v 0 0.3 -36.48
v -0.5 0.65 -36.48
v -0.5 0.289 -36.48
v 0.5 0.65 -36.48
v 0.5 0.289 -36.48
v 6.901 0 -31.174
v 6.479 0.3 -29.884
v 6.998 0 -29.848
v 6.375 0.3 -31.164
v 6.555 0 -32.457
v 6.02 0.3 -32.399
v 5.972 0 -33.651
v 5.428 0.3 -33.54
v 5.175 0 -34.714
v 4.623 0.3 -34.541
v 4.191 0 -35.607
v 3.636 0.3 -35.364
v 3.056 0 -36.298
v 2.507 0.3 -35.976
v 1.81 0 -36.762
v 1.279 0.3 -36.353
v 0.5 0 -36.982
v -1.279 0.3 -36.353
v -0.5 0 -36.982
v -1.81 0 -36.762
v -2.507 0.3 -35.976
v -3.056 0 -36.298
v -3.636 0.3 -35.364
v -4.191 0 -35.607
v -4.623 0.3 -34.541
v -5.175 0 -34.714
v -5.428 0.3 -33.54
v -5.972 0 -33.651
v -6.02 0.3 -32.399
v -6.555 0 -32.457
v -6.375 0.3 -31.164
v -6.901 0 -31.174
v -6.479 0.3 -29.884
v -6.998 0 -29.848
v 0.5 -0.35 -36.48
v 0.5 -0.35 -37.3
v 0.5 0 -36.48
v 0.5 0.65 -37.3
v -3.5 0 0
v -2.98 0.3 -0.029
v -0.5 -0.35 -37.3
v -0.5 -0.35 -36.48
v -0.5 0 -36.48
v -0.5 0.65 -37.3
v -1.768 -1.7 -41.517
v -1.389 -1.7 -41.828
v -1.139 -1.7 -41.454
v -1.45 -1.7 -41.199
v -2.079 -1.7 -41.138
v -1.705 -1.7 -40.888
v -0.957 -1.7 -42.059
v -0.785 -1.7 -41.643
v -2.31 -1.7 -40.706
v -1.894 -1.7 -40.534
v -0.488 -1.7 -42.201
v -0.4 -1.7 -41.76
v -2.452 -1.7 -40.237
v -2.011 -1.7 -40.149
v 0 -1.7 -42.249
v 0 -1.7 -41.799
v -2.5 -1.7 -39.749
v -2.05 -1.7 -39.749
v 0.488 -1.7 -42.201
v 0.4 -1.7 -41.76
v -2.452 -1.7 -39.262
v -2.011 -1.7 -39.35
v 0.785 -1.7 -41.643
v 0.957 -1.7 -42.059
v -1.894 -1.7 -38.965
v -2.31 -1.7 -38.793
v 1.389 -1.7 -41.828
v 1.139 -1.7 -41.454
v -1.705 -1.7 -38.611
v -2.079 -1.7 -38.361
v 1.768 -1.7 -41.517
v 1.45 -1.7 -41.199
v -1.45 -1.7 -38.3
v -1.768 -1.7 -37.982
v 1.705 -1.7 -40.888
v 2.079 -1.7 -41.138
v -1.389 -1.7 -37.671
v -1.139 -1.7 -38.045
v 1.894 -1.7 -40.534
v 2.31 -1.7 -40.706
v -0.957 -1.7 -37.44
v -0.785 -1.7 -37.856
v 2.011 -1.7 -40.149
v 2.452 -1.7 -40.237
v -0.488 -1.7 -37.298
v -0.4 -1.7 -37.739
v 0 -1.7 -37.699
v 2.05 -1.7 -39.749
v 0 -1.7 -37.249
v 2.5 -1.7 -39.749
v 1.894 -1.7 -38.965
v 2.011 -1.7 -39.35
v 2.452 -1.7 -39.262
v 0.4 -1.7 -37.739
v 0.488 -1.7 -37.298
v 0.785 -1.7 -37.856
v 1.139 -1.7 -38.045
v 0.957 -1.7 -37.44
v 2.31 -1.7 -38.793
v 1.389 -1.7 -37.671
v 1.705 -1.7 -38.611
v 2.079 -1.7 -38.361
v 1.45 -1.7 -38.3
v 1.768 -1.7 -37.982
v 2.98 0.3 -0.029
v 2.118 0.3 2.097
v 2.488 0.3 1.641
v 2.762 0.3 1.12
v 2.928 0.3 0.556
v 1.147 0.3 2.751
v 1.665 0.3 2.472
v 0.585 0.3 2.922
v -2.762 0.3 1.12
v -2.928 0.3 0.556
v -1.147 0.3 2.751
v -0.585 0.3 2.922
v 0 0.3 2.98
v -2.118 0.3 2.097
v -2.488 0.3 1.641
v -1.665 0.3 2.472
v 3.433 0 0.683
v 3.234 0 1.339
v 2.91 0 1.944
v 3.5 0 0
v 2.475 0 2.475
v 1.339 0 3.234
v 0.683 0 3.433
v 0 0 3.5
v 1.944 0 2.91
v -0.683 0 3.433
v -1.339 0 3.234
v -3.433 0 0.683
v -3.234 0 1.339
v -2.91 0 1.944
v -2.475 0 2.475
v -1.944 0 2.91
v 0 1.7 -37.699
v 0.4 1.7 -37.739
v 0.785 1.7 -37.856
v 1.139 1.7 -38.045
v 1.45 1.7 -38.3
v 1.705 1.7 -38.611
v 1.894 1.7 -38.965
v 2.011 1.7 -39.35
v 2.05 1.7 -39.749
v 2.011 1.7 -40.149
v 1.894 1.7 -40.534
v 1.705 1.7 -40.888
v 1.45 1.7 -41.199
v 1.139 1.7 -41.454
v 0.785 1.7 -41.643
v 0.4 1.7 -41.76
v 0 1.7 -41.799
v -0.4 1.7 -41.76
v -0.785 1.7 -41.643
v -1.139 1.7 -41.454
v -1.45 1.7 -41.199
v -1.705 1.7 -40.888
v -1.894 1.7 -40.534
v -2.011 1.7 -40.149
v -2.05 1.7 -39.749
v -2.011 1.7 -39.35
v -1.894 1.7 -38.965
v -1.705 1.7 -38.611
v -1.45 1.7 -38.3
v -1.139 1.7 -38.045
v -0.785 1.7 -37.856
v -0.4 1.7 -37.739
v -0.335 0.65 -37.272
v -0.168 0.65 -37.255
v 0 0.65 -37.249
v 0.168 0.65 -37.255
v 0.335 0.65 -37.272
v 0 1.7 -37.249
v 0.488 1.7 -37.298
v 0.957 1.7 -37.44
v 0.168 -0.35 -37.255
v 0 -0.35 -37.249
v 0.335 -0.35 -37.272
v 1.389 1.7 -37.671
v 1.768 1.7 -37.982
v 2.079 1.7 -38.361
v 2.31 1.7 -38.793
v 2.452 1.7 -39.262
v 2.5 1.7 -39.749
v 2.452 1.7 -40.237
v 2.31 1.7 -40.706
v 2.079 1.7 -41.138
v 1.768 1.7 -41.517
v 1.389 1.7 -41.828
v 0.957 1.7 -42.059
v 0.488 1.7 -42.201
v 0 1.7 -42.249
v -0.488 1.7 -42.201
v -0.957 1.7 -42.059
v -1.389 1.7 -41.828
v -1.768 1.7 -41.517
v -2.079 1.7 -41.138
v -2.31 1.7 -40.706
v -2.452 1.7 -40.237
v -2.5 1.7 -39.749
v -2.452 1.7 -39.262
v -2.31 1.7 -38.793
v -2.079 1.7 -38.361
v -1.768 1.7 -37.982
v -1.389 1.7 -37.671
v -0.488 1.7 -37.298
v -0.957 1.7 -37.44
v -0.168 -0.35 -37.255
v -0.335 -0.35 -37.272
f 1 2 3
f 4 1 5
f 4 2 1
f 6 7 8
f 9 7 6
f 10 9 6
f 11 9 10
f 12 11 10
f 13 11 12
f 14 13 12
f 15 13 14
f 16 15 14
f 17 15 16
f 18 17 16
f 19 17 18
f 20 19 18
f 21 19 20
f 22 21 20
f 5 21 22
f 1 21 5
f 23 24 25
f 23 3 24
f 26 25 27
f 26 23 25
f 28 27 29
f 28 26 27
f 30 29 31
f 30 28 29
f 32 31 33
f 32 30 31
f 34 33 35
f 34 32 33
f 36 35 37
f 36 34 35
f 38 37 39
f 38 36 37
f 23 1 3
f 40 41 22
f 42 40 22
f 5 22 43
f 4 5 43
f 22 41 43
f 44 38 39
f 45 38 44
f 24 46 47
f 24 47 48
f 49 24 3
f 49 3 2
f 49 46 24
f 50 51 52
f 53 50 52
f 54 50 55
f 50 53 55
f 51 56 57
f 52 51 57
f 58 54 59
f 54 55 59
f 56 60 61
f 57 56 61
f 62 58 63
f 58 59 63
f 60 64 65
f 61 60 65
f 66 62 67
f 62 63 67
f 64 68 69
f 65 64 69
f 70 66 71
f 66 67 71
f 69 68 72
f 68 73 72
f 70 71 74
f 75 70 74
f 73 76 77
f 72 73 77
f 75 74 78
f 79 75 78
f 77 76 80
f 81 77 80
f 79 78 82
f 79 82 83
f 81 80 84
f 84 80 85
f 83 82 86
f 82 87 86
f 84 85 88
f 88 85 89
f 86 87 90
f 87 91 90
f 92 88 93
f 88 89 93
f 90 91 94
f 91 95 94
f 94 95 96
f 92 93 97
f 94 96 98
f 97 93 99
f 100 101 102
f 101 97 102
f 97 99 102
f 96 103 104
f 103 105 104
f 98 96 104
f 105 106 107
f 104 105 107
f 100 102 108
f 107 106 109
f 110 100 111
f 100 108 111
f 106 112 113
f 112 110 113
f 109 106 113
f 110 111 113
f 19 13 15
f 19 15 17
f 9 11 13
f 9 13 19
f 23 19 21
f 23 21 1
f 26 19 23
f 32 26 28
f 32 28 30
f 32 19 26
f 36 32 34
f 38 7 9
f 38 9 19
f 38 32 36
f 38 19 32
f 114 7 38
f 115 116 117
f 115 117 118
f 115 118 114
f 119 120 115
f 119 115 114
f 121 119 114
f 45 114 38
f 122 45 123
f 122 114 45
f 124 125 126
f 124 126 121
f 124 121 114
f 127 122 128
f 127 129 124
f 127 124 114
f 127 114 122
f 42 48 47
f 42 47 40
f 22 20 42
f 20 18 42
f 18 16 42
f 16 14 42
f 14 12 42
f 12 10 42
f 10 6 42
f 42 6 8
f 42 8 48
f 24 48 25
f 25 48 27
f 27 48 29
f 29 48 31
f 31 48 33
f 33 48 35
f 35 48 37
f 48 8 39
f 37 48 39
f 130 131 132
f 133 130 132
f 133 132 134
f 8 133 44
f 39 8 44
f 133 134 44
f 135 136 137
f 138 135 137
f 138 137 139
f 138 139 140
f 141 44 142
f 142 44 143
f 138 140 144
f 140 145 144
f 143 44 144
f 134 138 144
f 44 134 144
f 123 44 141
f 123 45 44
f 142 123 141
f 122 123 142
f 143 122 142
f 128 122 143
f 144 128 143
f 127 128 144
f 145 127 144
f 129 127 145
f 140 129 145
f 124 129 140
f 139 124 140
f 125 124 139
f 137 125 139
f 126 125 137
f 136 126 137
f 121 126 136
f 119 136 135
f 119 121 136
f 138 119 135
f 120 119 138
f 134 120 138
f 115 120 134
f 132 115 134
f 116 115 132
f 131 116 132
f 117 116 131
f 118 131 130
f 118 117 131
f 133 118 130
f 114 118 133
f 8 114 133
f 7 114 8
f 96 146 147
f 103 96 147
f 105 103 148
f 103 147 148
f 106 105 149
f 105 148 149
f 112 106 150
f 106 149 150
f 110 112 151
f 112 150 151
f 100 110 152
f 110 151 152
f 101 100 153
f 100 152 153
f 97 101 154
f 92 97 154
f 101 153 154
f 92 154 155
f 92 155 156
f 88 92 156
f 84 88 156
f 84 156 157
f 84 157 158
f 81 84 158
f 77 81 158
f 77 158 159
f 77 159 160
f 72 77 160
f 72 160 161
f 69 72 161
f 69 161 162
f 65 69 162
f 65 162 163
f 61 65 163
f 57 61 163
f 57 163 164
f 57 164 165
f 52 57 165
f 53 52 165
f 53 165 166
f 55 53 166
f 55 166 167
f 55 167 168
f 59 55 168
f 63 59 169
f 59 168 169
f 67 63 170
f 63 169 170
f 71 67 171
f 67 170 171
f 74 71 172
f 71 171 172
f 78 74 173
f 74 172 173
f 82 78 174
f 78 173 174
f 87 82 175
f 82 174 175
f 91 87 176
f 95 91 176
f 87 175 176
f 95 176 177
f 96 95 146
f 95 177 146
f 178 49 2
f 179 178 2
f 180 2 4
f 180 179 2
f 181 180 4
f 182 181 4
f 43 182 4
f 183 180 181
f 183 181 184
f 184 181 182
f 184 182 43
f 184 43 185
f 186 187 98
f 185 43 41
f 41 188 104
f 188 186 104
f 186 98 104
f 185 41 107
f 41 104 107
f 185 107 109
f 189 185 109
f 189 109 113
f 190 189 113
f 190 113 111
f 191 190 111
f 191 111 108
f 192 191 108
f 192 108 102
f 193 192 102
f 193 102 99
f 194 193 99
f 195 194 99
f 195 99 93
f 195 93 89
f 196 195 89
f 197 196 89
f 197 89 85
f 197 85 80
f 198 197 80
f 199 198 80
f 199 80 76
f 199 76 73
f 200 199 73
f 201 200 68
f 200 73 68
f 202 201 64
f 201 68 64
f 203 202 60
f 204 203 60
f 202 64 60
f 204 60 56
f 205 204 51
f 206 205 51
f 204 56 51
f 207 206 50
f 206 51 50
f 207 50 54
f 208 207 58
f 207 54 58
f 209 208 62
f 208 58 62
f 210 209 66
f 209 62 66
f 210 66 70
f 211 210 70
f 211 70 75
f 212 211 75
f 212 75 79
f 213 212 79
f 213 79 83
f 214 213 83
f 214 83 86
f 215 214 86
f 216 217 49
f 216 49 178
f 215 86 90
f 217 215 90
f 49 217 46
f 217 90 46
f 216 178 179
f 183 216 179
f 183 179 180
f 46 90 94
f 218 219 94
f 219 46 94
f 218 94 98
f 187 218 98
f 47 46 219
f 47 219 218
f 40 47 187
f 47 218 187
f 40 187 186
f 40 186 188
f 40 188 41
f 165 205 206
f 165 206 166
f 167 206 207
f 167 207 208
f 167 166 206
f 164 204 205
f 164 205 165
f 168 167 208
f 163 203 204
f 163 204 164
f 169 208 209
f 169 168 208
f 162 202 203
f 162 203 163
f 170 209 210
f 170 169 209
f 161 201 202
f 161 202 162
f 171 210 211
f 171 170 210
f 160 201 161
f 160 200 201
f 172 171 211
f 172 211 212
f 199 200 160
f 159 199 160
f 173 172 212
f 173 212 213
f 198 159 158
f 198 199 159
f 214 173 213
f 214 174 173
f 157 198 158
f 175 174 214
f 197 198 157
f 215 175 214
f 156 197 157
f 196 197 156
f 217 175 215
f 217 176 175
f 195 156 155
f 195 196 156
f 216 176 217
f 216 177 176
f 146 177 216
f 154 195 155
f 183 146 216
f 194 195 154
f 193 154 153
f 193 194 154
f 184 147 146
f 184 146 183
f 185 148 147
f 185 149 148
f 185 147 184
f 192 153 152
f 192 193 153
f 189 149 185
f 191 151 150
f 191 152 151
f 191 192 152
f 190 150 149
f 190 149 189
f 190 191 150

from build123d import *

# Parameters (mm, degrees)
SALIENTE_EXTRUIR1_DEPTH      = 0.3
SALIENTE_EXTRUIR1_TAPER      = 60
CROQUIS3_W                   = 1
CROQUIS3_H                   = 1
SALIENTE_EXTRUIR2_DEPTH      = 0.3
CROQUIS4_W                   = 1
CROQUIS4_H                   = 1
SALIENTE_EXTRUIR3_DEPTH      = 0.519615
SALIENTE_EXTRUIR4_DEPTH      = 1.7
SALIENTE_EXTRUIR4_DEPTH_BACK = 1.7
CROQUIS5_R                   = 2.5
CROQUIS7_R                   = 2.05
CORTAR_EXTRUIR1_DEPTH        = 43.960206994


with BuildPart() as part:
    # Croquis1 → Saliente-Extruir1 (new body)
    with BuildSketch(Plane(origin=(0, 0, 0), x_dir=(1, 0, 0), z_dir=(0, 1, 0))):
        with BuildLine():
            ThreePointArc((-3.5, 0), (0, -3.5), (3.5, 0))
            Line((3.5, 0), (6.998354756, 29.848241299))
            ThreePointArc((6.998354756, 29.848241299), (0, 37), (-6.998354756, 29.848241299))
            Line((-6.998354756, 29.848241299), (-3.5, 0))
        make_face()
    extrude(amount=SALIENTE_EXTRUIR1_DEPTH, taper=SALIENTE_EXTRUIR1_TAPER)



with BuildPart() as body_2:
    # Croquis3 → Saliente-Extruir2 (new body)
    with BuildSketch(Plane.XY.offset(-37)):
        with Locations((0, 0.15)):
            Rectangle(CROQUIS3_W, CROQUIS3_H)
    extrude(amount=-SALIENTE_EXTRUIR2_DEPTH)


with BuildPart() as part_1:
    add(part.part)

    add(body_2.part)  # Saliente-Extruir3 merges body 2
    # Croquis4 → Saliente-Extruir3 (add)
    with BuildSketch(Plane.XY.offset(-37)):
        with Locations((0, 0.15)):
            Rectangle(CROQUIS4_W, CROQUIS4_H)
    extrude(amount=SALIENTE_EXTRUIR3_DEPTH)

    # Croquis5 → Saliente-Extruir4 (add, two sides: drawn at the far end of the back side and taken through both)
    with BuildSketch(Plane(origin=(0, 0, 0), x_dir=(1, 0, 0), z_dir=(0, 1, 0)).offset(-SALIENTE_EXTRUIR4_DEPTH_BACK)):
        with Locations(Location((0, 39.749489743, 0), (0, 0, 270))):
            Circle(CROQUIS5_R)
    extrude(amount=SALIENTE_EXTRUIR4_DEPTH + SALIENTE_EXTRUIR4_DEPTH_BACK)

    # Croquis7 → Cortar-Extruir1 (cut, through all)
    with BuildSketch(Plane(origin=(0, 1.7, 0), x_dir=(1, 0, 0), z_dir=(0, 1, 0))):
        with Locations(Location((0, 39.749489743, 0), (0, 0, 270))):
            Circle(CROQUIS7_R)
    extrude(amount=-CORTAR_EXTRUIR1_DEPTH, mode=Mode.SUBTRACT)


solid = part_1.part
